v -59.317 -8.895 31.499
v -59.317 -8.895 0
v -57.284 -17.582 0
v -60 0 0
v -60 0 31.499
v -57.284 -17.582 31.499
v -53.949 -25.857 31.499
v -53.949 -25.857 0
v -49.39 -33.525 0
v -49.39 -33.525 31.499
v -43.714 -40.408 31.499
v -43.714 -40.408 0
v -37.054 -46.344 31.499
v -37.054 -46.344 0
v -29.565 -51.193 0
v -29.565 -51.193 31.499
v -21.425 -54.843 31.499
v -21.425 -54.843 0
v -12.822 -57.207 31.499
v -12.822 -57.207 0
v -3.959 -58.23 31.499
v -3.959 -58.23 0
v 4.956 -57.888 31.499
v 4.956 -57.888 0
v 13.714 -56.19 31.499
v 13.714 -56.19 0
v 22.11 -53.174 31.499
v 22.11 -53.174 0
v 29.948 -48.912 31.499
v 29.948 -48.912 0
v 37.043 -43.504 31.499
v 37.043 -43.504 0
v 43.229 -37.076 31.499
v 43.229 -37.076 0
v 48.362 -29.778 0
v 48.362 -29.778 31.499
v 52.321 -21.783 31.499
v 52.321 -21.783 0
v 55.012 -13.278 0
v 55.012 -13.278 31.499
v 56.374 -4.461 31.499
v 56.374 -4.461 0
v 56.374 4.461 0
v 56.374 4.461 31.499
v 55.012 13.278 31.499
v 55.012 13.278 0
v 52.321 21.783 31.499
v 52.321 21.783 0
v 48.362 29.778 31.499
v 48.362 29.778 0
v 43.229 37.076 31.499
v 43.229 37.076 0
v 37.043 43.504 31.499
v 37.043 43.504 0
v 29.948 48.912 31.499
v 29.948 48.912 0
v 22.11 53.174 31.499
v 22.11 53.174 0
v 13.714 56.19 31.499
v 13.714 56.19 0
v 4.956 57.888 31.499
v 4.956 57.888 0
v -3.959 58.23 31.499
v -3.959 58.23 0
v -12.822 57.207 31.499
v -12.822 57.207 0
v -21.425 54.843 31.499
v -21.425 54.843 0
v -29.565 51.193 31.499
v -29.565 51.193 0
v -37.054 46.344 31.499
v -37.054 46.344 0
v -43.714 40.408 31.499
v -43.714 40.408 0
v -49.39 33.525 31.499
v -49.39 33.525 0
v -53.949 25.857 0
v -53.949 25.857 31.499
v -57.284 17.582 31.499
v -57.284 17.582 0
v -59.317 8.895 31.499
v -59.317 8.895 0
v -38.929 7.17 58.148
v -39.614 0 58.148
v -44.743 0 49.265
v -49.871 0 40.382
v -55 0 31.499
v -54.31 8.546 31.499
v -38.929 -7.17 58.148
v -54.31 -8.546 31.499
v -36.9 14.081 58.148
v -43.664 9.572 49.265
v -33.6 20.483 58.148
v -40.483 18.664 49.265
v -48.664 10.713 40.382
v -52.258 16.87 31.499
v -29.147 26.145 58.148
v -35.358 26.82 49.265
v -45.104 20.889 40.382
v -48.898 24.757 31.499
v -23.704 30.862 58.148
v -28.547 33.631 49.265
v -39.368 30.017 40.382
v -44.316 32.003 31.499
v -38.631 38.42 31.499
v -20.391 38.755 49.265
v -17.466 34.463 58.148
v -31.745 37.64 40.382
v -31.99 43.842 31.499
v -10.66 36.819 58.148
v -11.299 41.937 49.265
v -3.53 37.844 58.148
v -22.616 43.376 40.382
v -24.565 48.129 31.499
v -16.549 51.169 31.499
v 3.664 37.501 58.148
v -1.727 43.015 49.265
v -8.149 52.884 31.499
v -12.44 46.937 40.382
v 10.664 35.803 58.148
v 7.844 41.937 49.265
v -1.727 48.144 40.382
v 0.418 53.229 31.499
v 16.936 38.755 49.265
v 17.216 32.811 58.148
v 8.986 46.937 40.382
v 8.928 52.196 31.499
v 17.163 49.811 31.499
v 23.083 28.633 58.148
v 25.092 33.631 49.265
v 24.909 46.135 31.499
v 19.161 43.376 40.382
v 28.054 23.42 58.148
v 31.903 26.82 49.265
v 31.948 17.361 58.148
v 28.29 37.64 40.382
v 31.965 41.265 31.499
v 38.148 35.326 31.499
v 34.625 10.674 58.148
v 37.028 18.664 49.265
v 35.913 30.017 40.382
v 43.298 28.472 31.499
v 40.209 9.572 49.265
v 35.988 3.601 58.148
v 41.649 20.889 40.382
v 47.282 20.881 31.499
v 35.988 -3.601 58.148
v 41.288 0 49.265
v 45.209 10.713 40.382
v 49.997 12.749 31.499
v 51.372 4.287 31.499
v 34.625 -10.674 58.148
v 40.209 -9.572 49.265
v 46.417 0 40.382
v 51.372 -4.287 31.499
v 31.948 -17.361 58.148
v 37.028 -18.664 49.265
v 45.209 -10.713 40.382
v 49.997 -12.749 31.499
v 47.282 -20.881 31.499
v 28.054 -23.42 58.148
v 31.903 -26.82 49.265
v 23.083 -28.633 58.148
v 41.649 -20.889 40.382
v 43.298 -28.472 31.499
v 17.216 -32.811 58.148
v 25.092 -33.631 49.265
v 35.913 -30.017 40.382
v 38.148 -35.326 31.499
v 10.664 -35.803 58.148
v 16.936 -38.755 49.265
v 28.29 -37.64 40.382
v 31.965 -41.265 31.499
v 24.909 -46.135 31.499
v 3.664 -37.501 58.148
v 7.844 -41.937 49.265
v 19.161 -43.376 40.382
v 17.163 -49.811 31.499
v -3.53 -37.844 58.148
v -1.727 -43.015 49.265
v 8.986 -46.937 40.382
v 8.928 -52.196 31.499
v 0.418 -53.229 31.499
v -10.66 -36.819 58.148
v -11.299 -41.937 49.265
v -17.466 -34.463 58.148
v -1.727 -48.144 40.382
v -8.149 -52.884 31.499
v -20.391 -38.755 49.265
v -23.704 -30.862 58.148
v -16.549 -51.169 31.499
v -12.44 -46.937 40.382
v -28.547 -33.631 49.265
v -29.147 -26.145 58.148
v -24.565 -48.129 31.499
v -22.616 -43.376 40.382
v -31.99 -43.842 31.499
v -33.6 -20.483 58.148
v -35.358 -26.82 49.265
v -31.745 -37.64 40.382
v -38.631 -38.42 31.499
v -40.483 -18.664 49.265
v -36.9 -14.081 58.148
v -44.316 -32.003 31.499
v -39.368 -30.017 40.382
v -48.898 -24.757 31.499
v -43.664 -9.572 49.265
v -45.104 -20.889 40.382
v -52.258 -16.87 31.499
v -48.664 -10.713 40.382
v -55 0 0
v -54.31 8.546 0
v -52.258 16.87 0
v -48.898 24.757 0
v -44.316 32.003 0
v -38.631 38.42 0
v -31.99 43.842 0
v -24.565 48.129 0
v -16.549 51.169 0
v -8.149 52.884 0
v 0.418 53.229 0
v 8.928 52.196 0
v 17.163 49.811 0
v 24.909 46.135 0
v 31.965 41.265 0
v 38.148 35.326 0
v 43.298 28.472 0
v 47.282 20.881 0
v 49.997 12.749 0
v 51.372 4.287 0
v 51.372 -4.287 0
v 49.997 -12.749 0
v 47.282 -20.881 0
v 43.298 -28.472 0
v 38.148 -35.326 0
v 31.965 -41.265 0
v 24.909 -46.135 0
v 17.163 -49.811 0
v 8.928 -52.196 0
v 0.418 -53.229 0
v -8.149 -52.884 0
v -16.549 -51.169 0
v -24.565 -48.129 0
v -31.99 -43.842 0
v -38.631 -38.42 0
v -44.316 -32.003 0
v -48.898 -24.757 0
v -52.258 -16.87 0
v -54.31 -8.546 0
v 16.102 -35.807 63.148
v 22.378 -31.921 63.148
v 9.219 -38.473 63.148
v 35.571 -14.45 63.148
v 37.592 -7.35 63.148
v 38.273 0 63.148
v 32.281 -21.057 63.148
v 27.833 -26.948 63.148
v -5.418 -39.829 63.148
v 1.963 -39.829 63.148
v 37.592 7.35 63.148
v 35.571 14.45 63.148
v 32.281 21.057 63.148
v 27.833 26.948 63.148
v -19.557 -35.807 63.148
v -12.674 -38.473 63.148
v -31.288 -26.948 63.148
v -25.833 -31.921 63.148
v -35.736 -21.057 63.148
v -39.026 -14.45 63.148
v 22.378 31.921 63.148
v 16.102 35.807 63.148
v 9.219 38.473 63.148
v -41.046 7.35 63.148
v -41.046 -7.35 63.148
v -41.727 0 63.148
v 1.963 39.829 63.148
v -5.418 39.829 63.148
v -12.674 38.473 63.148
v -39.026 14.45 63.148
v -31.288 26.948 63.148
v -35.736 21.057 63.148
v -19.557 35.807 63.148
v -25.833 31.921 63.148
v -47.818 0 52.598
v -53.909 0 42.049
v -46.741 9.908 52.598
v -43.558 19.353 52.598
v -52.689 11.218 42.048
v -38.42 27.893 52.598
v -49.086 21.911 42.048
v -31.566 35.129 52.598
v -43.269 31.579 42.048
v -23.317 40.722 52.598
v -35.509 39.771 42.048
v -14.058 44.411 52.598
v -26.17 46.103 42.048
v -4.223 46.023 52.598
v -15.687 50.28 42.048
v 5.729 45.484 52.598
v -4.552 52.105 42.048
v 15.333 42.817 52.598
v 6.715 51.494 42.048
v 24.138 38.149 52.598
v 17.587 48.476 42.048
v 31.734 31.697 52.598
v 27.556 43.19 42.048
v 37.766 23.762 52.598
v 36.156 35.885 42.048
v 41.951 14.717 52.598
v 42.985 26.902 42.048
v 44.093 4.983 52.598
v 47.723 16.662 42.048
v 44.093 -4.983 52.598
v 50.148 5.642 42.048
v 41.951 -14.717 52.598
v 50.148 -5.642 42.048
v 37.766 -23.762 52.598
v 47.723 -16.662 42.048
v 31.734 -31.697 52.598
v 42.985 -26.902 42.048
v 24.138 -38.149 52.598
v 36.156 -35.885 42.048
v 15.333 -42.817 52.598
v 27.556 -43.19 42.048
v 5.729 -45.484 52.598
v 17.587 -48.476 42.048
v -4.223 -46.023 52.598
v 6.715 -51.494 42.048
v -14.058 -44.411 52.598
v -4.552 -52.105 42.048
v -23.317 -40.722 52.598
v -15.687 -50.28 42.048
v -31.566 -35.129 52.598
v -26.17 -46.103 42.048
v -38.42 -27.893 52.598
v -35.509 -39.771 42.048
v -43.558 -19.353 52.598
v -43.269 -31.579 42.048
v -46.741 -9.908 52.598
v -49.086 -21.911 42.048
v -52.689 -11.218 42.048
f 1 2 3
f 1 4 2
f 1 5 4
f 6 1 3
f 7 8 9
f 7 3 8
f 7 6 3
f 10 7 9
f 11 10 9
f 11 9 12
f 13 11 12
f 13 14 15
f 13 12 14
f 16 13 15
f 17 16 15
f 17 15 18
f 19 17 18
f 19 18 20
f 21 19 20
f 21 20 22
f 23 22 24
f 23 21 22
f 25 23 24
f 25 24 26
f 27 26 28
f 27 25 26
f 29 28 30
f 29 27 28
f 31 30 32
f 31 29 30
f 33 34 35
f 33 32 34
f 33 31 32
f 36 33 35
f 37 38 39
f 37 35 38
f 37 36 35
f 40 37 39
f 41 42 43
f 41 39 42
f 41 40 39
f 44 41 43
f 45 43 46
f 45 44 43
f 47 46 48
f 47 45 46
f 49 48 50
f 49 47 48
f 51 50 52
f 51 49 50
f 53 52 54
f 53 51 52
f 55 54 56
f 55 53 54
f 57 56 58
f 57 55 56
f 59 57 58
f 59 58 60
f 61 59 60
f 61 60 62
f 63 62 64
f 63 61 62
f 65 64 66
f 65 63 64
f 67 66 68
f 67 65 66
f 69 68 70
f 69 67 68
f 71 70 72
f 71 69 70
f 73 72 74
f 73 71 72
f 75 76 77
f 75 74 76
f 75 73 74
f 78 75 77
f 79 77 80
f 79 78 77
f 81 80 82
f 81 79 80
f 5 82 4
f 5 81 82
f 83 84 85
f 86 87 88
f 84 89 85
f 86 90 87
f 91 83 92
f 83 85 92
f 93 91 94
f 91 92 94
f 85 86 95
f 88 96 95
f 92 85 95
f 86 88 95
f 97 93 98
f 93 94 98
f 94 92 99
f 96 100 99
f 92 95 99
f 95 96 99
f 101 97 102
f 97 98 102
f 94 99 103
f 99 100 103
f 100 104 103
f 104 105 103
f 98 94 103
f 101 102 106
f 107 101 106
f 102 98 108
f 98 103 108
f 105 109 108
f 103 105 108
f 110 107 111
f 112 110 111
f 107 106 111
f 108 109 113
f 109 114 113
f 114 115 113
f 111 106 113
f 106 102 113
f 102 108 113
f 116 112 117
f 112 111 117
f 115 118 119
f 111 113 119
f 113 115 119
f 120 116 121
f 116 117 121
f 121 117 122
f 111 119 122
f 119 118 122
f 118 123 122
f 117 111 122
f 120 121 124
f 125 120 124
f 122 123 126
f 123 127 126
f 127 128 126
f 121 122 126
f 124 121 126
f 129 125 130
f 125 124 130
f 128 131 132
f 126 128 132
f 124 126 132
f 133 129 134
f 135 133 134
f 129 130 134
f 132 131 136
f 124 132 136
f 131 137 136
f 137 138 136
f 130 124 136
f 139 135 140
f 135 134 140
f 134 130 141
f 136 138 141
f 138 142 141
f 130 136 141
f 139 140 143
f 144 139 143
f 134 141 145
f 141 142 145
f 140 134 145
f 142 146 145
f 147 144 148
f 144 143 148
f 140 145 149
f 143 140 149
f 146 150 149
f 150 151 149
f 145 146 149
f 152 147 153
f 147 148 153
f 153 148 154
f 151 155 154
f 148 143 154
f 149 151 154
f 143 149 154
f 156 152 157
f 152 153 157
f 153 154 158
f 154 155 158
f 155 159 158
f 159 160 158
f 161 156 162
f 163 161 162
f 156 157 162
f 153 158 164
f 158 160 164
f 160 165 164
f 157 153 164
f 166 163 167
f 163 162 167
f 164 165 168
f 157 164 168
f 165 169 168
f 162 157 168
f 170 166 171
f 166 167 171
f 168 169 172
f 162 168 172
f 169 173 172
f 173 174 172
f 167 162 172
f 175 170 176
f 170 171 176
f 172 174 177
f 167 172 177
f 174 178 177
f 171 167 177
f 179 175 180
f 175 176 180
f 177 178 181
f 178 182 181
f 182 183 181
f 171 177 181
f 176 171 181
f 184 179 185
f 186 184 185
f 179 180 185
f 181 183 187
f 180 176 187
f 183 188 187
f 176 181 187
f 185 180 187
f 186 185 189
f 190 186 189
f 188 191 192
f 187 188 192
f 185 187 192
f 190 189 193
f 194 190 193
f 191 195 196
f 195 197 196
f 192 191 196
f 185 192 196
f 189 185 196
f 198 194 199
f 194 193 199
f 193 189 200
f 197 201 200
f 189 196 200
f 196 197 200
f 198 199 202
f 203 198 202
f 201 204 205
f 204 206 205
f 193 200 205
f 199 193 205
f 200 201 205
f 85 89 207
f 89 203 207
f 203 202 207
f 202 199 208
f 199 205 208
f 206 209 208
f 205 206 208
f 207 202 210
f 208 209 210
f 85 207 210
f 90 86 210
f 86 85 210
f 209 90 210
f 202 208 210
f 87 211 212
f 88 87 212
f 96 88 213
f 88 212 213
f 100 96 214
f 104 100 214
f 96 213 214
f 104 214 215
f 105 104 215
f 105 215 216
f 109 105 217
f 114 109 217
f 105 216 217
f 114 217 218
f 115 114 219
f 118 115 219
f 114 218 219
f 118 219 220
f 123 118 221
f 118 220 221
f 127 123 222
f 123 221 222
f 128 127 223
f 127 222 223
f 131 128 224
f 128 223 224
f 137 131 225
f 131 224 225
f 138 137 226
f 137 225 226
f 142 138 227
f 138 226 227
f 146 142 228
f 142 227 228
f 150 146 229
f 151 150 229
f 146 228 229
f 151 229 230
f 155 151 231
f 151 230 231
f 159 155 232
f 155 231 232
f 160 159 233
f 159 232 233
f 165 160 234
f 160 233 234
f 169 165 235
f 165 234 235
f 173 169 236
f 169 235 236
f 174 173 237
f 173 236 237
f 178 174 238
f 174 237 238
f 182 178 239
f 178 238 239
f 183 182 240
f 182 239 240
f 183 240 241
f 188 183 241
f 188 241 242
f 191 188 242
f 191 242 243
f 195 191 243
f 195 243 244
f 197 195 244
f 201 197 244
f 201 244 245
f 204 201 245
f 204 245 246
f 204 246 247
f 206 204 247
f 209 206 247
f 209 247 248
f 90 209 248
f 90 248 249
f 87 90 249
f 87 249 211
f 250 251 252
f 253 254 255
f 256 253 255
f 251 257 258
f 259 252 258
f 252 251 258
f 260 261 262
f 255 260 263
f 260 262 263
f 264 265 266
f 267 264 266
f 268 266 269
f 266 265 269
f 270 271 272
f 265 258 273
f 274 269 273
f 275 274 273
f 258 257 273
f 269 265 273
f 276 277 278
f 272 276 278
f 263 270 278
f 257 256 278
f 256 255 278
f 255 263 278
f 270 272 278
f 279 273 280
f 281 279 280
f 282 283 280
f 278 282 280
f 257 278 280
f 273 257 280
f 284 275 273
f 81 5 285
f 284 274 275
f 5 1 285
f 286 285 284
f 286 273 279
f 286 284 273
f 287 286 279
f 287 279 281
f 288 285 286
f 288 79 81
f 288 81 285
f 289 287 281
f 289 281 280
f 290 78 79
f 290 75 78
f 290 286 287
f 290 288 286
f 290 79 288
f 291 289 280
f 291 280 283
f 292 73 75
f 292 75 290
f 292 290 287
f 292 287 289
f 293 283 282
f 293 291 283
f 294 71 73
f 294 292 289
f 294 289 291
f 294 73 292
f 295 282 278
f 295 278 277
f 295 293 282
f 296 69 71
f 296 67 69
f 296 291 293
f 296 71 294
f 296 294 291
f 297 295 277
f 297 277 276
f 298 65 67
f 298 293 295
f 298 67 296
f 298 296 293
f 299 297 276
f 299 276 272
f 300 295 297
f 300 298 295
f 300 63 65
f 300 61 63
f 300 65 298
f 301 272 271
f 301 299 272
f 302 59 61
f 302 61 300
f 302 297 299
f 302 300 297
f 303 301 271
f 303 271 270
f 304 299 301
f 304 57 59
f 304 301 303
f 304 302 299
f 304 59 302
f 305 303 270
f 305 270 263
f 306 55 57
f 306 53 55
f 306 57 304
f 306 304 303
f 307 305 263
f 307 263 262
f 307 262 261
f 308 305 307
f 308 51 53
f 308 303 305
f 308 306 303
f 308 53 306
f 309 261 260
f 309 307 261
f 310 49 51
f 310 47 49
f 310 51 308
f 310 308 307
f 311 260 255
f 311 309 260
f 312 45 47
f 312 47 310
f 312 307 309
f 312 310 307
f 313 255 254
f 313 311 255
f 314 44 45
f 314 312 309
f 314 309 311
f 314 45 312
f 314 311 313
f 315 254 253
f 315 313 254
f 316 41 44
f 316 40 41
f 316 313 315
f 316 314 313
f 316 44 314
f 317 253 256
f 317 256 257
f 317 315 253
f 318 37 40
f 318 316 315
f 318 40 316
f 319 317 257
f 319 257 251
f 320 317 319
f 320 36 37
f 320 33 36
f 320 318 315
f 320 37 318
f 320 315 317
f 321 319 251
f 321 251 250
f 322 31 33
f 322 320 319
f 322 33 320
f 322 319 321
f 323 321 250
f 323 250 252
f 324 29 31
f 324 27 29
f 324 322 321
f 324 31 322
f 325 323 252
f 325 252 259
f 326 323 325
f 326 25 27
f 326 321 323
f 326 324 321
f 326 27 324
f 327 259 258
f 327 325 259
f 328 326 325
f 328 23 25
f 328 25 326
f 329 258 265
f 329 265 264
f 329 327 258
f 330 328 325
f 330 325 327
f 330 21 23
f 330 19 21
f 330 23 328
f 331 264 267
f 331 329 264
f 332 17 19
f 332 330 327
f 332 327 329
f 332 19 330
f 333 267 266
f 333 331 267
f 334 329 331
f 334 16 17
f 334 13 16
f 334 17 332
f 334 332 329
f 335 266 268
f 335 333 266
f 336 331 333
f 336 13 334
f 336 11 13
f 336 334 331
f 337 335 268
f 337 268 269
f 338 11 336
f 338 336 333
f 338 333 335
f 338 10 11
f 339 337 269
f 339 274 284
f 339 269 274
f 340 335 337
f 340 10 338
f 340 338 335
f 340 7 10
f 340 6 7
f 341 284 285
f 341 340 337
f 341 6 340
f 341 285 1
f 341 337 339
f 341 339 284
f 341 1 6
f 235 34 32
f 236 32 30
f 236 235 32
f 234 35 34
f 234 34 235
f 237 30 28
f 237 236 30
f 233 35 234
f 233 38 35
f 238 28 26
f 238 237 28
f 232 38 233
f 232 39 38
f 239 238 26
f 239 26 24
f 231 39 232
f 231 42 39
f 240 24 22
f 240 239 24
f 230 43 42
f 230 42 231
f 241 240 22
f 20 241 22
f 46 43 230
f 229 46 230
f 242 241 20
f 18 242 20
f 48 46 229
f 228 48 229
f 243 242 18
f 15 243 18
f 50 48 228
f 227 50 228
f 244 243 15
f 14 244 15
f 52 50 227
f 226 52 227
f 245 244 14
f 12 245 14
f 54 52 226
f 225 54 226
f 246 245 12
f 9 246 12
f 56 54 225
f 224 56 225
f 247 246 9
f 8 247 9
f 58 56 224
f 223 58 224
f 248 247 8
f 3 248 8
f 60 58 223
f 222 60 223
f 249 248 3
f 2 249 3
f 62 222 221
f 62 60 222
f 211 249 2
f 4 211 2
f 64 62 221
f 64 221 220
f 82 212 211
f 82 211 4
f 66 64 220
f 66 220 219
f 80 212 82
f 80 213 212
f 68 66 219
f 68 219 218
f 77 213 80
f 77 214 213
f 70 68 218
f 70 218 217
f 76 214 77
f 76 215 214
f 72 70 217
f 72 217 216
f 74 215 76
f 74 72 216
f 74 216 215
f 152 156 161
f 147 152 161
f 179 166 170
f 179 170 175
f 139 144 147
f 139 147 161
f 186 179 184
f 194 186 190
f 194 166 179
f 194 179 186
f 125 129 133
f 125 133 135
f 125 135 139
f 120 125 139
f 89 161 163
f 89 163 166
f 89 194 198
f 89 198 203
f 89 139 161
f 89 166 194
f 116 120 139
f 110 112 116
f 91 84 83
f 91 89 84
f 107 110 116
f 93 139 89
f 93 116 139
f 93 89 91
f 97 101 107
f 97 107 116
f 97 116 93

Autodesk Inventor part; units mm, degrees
ref_plane "YZ Plane" through (0, 0, 0) normal (1, 0, 0) x (0, 1, 0)
ref_plane "XZ Plane" through (0, 0, 0) normal (0, 1, 0) x (-1, 0, 0)
ref_plane "XY Plane" through (0, 0, 0) normal (0, 0, 1) x (1, 0, 0)
sketch "Skizze2" plane through (0, 0, 0) normal (0, 1, 0) x (-1, 0, 0)
  line L0 (-60, -3) -> (60, -3) projected
  line L1 (60, 0) -> (60, -3)
  line L2 (-60, 0) -> (60, 0) projected
  line L3 (-60, 0) -> (-60, -3)
  line L4 (1.7274, 123.0345) -> (1.7274, -32.1262)
  line L5 (60, 0) -> (60, 31.4988)
  line L6 (60, 31.4988) -> (41.7274, 63.1479)
  line L7 (41.7274, 63.1479) -> (1.7274, 63.1479)
  line L8 (1.7274, 63.1479) -> (1.7274, 58.1479)
  line L9 (39.6141, 58.1479) -> (1.7274, 58.1479)
  line L10 (39.6141, 58.1479) -> (55, 31.4988)
  line L11 (55, 31.4988) -> (55, 0)
  line L12 (60, 0) -> (55, 0)
  point P0 (0, 0)
  dimension "d0" = 31.4988
  dimension "d1" = 150
  dimension "d2" = 40
  dimension "d4" = 31.6491
  dimension "d5" = 150
  dimension "d6" = 5
  dimension "d7" = 5
revolve "Umdrehung1" add sketch "Skizze2" angle 360 about axis through (-1.7274, 0, 123.0345) along (0, 0, -1) contours L2 L11 L10 L9 L4 L7 L6 L5
properties part number "GehaeuseteilB"
